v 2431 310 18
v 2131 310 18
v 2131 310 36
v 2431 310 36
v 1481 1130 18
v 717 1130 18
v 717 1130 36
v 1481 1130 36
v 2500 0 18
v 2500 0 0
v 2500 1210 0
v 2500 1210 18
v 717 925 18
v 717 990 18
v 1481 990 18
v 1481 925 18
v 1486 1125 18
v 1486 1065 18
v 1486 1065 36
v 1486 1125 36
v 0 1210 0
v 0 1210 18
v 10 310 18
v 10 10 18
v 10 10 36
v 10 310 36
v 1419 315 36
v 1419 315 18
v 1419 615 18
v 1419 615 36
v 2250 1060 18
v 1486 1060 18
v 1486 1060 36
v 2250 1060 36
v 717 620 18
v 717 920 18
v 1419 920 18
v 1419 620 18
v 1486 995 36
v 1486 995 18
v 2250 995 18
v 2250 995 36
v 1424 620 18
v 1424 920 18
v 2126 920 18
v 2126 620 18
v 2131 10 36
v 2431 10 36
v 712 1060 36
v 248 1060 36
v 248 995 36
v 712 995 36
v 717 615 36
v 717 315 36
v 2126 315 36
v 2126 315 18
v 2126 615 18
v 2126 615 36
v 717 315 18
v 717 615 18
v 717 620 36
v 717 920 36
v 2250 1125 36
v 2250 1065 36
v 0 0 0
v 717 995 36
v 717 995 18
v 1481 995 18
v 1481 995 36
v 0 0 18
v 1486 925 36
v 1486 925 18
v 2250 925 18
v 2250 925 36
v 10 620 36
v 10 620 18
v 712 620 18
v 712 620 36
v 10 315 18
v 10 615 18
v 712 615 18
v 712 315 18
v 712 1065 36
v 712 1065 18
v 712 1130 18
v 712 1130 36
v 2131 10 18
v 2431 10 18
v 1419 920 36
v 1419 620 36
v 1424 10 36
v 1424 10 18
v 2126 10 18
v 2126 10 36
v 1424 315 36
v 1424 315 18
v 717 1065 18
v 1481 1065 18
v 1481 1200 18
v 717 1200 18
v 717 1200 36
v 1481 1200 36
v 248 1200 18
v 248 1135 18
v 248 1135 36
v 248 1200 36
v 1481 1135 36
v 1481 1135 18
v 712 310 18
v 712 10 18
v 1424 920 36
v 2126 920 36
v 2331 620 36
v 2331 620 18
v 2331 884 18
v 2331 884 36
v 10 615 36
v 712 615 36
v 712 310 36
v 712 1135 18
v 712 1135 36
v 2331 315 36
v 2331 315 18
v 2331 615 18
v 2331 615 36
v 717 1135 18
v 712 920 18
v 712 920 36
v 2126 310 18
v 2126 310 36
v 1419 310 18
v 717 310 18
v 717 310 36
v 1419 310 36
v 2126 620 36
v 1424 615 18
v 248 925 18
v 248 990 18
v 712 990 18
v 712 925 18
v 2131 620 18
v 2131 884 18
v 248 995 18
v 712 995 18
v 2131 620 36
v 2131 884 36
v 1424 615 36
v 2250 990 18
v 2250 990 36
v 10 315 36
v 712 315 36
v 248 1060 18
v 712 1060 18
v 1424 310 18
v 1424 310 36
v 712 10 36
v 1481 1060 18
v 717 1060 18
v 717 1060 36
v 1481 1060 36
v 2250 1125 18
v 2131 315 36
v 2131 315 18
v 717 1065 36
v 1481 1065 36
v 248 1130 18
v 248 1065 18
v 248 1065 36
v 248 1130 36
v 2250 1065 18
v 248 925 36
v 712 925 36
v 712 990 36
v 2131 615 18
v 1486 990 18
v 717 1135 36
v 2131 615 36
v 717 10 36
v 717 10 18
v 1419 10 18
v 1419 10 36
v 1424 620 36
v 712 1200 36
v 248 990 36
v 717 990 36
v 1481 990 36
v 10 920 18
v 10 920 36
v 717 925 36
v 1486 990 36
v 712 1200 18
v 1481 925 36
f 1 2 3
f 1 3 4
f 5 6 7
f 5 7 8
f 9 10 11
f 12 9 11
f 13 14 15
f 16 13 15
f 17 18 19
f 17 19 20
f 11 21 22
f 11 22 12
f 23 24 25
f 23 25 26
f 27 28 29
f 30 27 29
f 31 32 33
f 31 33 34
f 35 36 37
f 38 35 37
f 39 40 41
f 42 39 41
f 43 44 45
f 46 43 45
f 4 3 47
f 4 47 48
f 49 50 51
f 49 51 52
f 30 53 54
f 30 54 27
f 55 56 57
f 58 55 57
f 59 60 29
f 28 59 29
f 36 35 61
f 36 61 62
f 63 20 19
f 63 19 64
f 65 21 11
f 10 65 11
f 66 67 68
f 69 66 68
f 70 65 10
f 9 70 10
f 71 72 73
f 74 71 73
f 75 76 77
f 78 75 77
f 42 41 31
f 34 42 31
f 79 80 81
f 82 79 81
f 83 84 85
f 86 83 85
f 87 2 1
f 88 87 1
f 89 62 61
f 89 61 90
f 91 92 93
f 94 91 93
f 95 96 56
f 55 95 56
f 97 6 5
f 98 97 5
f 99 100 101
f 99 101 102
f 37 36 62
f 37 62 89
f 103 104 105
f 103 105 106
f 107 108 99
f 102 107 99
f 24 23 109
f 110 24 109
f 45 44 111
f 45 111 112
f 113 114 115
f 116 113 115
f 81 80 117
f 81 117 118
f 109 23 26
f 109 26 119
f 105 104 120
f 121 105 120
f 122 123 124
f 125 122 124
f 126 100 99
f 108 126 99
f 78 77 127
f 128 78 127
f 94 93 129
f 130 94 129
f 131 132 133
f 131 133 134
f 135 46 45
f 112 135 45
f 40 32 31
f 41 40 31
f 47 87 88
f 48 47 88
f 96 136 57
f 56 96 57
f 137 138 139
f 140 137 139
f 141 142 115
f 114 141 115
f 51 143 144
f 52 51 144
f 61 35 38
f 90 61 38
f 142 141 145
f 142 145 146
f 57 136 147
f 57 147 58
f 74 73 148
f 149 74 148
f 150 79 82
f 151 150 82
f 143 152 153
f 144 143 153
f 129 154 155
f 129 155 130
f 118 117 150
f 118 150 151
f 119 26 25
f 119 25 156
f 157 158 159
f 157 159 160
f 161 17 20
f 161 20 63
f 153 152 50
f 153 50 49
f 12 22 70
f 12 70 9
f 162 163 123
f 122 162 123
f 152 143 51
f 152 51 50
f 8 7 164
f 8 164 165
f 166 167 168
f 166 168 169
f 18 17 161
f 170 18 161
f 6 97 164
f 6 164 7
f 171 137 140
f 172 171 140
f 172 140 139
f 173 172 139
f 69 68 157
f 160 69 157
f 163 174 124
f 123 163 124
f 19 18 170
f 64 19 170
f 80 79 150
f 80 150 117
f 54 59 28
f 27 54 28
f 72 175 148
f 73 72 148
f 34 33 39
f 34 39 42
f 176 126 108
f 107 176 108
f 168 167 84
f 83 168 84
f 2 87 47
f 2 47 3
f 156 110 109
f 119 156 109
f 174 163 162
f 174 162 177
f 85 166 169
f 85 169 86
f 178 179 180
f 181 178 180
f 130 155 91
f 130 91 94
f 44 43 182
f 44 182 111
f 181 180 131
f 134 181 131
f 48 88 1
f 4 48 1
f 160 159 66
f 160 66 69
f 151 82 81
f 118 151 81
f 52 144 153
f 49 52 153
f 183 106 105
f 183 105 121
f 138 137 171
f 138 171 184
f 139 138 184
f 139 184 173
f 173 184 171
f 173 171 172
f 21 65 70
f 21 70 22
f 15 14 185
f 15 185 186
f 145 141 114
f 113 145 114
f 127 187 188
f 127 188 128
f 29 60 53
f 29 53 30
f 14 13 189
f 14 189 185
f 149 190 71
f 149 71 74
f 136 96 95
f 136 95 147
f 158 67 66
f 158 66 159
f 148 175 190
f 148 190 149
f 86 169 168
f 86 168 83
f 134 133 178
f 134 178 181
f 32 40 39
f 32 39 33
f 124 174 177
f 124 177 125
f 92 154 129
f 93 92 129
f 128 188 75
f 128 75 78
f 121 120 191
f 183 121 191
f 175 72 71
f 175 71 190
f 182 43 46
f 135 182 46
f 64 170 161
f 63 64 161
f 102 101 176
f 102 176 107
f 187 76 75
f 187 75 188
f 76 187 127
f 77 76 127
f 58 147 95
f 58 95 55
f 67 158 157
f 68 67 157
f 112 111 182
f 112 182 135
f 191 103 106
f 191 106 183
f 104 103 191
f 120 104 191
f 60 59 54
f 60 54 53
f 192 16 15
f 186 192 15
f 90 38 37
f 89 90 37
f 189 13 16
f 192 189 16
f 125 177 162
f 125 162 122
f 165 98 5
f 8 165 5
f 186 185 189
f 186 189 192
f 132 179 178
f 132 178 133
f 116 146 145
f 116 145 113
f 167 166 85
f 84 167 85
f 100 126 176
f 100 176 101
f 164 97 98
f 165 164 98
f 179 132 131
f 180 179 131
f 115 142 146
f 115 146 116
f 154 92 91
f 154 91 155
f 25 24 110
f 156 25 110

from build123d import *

# Parameters (mm, degrees)
F0_W     = 2500
F0_H     = 1210
F1_DEPTH = 18
F2_W     = 702
F2_H     = 300
F2_W_2   = 464
F2_H_2   = 65
F2_W_3   = 764
F2_W_4   = 300
F2_W_5   = 200
F2_H_3   = 264
F2_H_4   = 60
F3_DEPTH = 18


with BuildPart() as f1:
    # F0 (on Top) → F1 (new body)
    with BuildSketch(Plane.XY):
        with Locations((1250, 605)):
            Rectangle(F0_W, F0_H)
    extrude(amount=F1_DEPTH)


with BuildPart() as f3:
    # F2 (on face) → F3 (new body)
    with BuildSketch(Plane.XY.offset(18)):
        with Locations((361, 160)):
            Rectangle(F2_W, F2_H)
        with Locations((361, 465)):
            Rectangle(F2_W, F2_H)
        with Locations((361, 770)):
            Rectangle(F2_W, F2_H)
        with Locations((1068, 160)):
            Rectangle(F2_W, F2_H)
        with Locations((1068, 465)):
            Rectangle(F2_W, F2_H)
        with Locations((1068, 770)):
            Rectangle(F2_W, F2_H)
        with Locations((480, 957.5)):
            Rectangle(F2_W_2, F2_H_2)
        with Locations((480, 1027.5)):
            Rectangle(F2_W_2, F2_H_2)
        with Locations((480, 1097.5)):
            Rectangle(F2_W_2, F2_H_2)
        with Locations((480, 1167.5)):
            Rectangle(F2_W_2, F2_H_2)
        with Locations((1099, 1167.5)):
            Rectangle(F2_W_3, F2_H_2)
        with Locations((1099, 1097.5)):
            Rectangle(F2_W_3, F2_H_2)
        with Locations((1099, 1027.5)):
            Rectangle(F2_W_3, F2_H_2)
        with Locations((1099, 957.5)):
            Rectangle(F2_W_3, F2_H_2)
        with Locations((1775, 160)):
            Rectangle(F2_W, F2_H)
        with Locations((1775, 465)):
            Rectangle(F2_W, F2_H)
        with Locations((2281, 160)):
            Rectangle(F2_W_4, F2_H)
        with Locations((2231, 465)):
            Rectangle(F2_W_5, F2_H)
        with Locations((2231, 752)):
            Rectangle(F2_W_5, F2_H_3)
        with Locations((1775, 770)):
            Rectangle(F2_W, F2_H)
        with Locations((1868, 957.5)):
            Rectangle(F2_W_3, F2_H_2)
        with Locations((1868, 1027.5)):
            Rectangle(F2_W_3, F2_H_2)
        with Locations((1868, 1095)):
            Rectangle(F2_W_3, F2_H_4)
    extrude(amount=F3_DEPTH)


solid = Compound([f1.part, f3.part])
